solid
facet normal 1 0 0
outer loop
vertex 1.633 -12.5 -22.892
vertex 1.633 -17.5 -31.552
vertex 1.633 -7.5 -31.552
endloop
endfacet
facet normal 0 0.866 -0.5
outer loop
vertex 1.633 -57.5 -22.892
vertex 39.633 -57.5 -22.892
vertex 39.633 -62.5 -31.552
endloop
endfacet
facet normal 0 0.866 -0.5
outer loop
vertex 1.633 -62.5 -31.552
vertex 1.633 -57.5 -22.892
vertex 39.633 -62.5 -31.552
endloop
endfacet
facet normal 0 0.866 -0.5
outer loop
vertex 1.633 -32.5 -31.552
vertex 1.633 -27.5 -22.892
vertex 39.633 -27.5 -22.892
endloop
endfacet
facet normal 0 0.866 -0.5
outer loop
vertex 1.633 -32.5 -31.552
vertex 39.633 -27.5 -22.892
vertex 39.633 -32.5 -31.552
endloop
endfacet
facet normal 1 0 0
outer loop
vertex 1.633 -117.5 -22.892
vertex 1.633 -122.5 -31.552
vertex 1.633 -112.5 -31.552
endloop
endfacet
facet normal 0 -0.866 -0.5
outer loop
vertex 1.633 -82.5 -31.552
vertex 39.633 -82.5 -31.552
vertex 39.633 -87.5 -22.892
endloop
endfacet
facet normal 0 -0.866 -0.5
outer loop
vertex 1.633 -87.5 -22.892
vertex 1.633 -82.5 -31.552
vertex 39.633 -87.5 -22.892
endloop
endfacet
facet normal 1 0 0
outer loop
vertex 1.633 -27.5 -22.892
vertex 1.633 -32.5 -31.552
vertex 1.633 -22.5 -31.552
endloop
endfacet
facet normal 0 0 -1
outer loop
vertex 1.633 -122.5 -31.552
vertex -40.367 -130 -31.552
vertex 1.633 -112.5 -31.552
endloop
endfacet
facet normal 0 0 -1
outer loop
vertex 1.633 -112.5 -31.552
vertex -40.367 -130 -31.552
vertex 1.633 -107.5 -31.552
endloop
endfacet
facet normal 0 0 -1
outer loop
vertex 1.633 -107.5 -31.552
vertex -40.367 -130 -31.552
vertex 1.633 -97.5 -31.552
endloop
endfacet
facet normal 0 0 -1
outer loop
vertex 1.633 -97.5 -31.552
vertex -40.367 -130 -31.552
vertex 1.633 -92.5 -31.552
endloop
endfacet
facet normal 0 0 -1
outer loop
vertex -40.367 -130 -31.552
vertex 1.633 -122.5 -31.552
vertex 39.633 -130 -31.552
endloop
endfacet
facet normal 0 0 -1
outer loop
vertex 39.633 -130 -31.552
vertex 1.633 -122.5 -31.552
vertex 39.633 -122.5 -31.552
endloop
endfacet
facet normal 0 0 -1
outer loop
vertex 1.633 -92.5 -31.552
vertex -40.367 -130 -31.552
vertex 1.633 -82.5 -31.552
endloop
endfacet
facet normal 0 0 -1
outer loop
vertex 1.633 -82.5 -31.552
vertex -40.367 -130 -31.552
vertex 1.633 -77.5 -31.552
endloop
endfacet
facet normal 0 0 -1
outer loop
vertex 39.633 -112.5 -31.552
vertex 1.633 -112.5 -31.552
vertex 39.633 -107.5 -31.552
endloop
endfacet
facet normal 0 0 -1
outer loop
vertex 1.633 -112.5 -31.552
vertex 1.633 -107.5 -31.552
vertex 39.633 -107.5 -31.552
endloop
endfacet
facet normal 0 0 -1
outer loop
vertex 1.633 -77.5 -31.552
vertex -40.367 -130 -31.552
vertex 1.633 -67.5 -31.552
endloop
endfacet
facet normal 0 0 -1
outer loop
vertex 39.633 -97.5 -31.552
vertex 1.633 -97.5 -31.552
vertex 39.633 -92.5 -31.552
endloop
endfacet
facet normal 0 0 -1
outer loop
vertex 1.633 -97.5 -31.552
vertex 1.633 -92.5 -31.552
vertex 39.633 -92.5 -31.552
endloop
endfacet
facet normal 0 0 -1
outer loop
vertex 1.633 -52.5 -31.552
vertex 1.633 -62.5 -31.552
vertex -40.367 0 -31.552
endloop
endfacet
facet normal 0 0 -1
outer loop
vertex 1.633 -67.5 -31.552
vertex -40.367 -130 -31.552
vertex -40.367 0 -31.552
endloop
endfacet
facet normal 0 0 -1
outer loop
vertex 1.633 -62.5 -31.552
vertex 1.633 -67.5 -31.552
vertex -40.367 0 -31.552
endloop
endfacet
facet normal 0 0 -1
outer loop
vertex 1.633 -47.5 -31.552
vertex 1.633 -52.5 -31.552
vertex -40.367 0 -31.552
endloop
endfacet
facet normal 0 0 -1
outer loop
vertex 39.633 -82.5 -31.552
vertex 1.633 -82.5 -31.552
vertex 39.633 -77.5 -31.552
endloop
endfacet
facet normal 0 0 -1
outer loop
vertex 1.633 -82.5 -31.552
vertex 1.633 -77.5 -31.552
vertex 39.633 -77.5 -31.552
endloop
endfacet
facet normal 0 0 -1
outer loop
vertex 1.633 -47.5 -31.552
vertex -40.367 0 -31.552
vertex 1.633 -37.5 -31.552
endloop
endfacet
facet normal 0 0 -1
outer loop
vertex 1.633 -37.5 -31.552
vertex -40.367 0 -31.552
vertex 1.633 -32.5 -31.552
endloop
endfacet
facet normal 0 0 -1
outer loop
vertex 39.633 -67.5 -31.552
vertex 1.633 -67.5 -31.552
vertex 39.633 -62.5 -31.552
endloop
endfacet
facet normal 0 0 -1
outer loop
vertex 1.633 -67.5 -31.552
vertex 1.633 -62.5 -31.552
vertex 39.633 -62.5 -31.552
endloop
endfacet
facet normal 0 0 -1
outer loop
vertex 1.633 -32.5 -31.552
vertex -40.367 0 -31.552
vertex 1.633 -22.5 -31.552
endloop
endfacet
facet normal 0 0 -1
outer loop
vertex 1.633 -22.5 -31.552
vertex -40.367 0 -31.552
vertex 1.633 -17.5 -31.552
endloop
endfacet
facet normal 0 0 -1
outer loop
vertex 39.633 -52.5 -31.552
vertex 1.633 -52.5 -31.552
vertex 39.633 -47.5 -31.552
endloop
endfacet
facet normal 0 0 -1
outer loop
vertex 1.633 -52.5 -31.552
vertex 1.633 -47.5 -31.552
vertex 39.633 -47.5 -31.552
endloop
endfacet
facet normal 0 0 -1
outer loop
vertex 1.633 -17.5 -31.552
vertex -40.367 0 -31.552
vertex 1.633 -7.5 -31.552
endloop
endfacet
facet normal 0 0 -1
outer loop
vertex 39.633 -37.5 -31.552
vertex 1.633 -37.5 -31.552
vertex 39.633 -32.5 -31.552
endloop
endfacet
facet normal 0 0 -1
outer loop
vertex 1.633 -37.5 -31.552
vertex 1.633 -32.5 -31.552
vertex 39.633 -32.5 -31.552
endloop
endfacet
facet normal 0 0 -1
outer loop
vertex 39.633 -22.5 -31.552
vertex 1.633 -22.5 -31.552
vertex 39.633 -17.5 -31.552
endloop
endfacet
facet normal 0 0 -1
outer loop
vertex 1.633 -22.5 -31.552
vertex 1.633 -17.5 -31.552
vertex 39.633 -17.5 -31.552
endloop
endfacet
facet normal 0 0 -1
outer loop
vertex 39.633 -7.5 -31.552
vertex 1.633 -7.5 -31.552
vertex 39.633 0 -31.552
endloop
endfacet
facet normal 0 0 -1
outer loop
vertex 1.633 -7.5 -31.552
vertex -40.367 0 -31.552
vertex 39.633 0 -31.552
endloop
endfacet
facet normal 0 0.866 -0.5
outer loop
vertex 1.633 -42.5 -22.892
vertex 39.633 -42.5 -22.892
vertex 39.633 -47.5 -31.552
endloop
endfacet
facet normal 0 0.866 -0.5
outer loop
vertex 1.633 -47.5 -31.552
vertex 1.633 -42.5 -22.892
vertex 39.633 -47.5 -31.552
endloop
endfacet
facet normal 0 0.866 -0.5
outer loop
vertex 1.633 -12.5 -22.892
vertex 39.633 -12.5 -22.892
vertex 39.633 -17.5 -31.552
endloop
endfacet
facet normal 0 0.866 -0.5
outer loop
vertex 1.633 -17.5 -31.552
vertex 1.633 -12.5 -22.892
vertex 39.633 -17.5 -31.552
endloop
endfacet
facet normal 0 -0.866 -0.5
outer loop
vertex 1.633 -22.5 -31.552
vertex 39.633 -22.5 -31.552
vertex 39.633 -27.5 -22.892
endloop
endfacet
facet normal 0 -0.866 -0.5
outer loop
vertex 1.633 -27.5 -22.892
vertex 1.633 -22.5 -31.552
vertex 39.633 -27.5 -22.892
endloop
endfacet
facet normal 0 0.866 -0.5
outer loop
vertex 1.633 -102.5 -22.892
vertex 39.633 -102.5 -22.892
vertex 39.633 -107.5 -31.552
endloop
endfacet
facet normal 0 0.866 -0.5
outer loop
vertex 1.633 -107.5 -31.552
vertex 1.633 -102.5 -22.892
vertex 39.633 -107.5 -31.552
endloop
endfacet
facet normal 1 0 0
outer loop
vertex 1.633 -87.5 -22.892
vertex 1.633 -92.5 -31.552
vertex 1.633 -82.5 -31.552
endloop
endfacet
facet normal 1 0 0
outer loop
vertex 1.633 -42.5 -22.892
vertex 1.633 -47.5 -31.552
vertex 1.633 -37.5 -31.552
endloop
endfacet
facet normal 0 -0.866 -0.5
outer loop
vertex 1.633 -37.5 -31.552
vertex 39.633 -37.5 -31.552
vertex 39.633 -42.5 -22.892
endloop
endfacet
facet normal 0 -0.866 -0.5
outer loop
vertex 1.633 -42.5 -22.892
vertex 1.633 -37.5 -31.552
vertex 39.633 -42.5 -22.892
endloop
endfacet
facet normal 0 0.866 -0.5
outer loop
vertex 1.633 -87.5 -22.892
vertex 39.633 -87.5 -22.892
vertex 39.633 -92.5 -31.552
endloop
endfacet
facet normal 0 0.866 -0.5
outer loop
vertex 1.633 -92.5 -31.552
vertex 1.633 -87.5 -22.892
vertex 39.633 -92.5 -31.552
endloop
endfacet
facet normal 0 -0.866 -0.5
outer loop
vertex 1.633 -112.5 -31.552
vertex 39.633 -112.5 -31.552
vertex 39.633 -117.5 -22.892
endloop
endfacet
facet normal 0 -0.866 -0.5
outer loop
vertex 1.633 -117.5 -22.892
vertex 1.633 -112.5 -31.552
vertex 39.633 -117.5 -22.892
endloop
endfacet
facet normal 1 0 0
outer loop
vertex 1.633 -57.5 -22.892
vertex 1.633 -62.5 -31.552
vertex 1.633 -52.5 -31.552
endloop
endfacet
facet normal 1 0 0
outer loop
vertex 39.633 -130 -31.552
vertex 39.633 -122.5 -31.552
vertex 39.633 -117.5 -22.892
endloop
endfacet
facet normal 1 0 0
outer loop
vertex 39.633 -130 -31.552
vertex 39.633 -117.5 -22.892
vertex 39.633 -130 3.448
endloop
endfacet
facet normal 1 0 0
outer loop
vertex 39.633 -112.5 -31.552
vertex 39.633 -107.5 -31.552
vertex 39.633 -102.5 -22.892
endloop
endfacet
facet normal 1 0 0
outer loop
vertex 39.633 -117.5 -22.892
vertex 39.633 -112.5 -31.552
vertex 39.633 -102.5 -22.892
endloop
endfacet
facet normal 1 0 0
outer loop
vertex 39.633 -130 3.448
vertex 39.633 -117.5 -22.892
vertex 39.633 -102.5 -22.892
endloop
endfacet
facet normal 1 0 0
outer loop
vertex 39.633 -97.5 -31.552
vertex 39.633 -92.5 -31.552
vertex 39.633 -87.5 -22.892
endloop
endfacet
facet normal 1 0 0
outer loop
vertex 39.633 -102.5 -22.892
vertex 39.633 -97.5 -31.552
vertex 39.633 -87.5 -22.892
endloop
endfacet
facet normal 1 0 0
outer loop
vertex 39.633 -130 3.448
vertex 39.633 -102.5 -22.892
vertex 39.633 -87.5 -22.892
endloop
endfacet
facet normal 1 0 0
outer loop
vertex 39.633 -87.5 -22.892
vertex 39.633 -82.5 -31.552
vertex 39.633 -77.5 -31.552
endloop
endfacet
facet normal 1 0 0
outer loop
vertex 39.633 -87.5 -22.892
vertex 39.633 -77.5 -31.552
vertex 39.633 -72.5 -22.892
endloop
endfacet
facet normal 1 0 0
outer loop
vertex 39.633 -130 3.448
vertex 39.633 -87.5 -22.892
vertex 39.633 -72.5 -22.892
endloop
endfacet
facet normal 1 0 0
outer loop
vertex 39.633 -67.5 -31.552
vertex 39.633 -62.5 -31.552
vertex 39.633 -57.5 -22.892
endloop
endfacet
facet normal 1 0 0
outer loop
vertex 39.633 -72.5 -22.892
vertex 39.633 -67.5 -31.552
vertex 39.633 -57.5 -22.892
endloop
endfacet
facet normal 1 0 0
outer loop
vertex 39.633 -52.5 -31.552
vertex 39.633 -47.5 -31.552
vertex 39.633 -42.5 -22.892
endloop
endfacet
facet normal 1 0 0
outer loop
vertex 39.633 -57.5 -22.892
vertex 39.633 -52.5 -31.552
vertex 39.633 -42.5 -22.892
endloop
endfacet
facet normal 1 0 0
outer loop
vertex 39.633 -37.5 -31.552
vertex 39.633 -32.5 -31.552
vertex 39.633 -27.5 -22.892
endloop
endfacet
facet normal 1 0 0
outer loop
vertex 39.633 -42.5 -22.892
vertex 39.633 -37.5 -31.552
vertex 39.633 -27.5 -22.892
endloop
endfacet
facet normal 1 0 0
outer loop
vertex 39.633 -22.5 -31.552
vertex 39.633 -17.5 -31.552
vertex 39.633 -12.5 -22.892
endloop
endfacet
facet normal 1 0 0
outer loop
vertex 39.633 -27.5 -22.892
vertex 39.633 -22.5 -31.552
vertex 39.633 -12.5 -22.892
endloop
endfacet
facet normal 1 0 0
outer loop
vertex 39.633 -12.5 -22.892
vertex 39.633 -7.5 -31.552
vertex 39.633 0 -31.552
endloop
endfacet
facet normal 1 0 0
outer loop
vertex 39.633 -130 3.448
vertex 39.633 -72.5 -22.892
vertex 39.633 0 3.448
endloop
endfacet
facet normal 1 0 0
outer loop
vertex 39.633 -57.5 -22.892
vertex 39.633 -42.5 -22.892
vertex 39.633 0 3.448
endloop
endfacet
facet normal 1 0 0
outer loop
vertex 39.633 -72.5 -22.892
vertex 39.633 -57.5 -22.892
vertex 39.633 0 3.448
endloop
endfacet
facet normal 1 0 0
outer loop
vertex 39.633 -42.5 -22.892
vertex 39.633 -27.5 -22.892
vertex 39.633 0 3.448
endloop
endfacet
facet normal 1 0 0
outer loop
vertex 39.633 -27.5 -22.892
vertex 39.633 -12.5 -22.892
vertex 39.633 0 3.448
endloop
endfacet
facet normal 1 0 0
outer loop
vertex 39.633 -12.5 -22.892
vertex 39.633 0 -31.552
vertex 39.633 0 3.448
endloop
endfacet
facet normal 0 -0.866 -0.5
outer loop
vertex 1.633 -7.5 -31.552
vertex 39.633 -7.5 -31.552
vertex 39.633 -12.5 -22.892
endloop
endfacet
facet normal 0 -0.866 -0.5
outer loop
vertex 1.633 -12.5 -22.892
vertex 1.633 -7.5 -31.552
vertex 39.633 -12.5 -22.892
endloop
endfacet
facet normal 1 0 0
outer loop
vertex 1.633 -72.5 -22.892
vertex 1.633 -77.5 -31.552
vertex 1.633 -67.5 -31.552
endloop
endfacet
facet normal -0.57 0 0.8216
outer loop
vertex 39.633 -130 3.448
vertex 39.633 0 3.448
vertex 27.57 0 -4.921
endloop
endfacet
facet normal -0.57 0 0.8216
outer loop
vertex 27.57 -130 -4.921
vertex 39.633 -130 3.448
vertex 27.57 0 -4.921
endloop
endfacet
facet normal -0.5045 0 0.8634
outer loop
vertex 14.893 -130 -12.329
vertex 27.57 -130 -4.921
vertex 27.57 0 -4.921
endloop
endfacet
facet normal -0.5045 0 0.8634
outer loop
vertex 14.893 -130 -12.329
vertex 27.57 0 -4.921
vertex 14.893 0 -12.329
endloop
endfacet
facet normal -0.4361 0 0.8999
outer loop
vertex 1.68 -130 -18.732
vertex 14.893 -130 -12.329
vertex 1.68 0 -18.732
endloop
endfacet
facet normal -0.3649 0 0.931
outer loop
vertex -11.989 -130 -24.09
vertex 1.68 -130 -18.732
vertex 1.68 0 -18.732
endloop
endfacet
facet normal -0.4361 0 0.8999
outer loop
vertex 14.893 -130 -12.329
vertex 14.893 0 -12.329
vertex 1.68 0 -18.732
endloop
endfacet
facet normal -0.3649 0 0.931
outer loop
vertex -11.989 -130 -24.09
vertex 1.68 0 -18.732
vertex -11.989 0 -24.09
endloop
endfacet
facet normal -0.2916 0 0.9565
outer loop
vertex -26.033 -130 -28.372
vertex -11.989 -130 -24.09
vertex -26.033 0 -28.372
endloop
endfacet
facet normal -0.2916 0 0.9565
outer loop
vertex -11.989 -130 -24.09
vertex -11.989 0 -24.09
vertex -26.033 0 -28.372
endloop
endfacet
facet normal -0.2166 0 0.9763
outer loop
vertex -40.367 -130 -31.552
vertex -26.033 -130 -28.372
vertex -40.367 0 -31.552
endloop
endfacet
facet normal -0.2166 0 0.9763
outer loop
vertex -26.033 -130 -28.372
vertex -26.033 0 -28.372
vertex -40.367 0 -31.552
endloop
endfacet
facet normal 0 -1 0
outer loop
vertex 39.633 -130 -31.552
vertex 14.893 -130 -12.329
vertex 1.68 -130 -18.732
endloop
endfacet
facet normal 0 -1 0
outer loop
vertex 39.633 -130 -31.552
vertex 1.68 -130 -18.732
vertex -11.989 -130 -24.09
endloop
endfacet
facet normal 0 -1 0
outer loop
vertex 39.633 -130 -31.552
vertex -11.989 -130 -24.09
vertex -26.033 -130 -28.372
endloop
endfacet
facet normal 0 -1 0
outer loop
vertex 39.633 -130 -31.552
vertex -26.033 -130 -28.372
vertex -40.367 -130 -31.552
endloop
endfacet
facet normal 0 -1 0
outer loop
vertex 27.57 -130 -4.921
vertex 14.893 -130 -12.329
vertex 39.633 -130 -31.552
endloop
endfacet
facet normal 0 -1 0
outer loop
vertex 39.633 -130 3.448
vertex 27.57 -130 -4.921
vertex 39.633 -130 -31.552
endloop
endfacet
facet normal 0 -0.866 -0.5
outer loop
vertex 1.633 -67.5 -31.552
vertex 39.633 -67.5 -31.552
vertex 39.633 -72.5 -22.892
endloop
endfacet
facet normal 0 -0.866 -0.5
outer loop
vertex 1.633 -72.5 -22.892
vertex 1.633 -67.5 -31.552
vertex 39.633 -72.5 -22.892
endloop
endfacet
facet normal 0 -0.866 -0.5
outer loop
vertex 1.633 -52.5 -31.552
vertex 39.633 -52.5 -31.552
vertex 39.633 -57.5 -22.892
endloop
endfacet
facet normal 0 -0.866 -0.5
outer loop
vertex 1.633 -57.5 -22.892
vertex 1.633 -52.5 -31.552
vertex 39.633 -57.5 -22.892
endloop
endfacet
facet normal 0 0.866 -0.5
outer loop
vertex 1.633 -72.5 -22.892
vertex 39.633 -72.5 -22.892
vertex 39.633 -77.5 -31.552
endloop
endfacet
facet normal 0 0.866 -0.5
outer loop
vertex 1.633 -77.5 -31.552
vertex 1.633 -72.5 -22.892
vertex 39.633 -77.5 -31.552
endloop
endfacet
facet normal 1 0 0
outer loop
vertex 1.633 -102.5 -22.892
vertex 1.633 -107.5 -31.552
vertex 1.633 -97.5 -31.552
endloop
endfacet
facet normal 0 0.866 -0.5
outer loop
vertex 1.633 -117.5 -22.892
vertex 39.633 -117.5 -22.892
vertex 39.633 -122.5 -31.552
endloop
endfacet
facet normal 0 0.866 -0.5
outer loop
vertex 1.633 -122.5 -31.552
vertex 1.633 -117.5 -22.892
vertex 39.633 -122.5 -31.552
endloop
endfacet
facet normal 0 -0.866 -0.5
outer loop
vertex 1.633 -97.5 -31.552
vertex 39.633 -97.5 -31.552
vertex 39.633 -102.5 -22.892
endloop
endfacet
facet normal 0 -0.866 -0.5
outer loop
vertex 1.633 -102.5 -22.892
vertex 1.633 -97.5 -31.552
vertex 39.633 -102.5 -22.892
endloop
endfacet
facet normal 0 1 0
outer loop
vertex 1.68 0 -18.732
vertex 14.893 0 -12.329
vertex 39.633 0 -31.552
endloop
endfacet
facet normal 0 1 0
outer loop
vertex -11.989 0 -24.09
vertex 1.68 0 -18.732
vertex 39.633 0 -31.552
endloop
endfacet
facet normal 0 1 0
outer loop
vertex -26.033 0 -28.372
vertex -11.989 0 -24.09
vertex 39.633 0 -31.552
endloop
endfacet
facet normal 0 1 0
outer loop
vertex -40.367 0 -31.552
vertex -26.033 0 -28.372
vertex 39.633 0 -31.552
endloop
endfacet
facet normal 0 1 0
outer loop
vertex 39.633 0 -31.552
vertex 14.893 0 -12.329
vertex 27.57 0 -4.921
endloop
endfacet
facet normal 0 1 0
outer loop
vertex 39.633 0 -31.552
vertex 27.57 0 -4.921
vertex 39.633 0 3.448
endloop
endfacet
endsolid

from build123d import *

# Parameters (mm, degrees)
F1_DEPTH = 130
F3_DEPTH = 38


with BuildPart() as f1:
    # F0 (on Front) → F1 (new body)
    with BuildSketch(Plane.XZ):
        with BuildLine():
            ThreePointArc((39.633115, 3.448032), (1.680451, -18.731595), (-40.366885, -31.551968))
            Line((-40.366885, -31.551968), (39.633115, -31.551968))
            Line((39.633115, -31.551968), (39.633115, 3.448032))
        make_face()
    extrude(amount=F1_DEPTH)

    # F2 (on face) → F3 (cut)
    with BuildSketch(Plane.YZ.offset(39.633115)):
        Polygon((-117.5, -22.891714), (-122.5, -31.551968), (-112.5, -31.551968), align=None)
        Polygon((-102.5, -22.891714), (-107.5, -31.551968), (-97.5, -31.551968), align=None)
        Polygon((-87.5, -22.891714), (-92.5, -31.551968), (-82.5, -31.551968), align=None)
        Polygon((-72.5, -22.891714), (-77.5, -31.551968), (-67.5, -31.551968), align=None)
        Polygon((-57.5, -22.891714), (-62.5, -31.551968), (-52.5, -31.551968), align=None)
        Polygon((-47.5, -31.551968), (-37.5, -31.551968), (-42.5, -22.891714), align=None)
        Polygon((-32.5, -31.551968), (-22.5, -31.551968), (-27.5, -22.891714), align=None)
        Polygon((-17.5, -31.551968), (-7.5, -31.551968), (-12.5, -22.891714), align=None)
    extrude(amount=-F3_DEPTH, mode=Mode.SUBTRACT)


solid = f1.part
